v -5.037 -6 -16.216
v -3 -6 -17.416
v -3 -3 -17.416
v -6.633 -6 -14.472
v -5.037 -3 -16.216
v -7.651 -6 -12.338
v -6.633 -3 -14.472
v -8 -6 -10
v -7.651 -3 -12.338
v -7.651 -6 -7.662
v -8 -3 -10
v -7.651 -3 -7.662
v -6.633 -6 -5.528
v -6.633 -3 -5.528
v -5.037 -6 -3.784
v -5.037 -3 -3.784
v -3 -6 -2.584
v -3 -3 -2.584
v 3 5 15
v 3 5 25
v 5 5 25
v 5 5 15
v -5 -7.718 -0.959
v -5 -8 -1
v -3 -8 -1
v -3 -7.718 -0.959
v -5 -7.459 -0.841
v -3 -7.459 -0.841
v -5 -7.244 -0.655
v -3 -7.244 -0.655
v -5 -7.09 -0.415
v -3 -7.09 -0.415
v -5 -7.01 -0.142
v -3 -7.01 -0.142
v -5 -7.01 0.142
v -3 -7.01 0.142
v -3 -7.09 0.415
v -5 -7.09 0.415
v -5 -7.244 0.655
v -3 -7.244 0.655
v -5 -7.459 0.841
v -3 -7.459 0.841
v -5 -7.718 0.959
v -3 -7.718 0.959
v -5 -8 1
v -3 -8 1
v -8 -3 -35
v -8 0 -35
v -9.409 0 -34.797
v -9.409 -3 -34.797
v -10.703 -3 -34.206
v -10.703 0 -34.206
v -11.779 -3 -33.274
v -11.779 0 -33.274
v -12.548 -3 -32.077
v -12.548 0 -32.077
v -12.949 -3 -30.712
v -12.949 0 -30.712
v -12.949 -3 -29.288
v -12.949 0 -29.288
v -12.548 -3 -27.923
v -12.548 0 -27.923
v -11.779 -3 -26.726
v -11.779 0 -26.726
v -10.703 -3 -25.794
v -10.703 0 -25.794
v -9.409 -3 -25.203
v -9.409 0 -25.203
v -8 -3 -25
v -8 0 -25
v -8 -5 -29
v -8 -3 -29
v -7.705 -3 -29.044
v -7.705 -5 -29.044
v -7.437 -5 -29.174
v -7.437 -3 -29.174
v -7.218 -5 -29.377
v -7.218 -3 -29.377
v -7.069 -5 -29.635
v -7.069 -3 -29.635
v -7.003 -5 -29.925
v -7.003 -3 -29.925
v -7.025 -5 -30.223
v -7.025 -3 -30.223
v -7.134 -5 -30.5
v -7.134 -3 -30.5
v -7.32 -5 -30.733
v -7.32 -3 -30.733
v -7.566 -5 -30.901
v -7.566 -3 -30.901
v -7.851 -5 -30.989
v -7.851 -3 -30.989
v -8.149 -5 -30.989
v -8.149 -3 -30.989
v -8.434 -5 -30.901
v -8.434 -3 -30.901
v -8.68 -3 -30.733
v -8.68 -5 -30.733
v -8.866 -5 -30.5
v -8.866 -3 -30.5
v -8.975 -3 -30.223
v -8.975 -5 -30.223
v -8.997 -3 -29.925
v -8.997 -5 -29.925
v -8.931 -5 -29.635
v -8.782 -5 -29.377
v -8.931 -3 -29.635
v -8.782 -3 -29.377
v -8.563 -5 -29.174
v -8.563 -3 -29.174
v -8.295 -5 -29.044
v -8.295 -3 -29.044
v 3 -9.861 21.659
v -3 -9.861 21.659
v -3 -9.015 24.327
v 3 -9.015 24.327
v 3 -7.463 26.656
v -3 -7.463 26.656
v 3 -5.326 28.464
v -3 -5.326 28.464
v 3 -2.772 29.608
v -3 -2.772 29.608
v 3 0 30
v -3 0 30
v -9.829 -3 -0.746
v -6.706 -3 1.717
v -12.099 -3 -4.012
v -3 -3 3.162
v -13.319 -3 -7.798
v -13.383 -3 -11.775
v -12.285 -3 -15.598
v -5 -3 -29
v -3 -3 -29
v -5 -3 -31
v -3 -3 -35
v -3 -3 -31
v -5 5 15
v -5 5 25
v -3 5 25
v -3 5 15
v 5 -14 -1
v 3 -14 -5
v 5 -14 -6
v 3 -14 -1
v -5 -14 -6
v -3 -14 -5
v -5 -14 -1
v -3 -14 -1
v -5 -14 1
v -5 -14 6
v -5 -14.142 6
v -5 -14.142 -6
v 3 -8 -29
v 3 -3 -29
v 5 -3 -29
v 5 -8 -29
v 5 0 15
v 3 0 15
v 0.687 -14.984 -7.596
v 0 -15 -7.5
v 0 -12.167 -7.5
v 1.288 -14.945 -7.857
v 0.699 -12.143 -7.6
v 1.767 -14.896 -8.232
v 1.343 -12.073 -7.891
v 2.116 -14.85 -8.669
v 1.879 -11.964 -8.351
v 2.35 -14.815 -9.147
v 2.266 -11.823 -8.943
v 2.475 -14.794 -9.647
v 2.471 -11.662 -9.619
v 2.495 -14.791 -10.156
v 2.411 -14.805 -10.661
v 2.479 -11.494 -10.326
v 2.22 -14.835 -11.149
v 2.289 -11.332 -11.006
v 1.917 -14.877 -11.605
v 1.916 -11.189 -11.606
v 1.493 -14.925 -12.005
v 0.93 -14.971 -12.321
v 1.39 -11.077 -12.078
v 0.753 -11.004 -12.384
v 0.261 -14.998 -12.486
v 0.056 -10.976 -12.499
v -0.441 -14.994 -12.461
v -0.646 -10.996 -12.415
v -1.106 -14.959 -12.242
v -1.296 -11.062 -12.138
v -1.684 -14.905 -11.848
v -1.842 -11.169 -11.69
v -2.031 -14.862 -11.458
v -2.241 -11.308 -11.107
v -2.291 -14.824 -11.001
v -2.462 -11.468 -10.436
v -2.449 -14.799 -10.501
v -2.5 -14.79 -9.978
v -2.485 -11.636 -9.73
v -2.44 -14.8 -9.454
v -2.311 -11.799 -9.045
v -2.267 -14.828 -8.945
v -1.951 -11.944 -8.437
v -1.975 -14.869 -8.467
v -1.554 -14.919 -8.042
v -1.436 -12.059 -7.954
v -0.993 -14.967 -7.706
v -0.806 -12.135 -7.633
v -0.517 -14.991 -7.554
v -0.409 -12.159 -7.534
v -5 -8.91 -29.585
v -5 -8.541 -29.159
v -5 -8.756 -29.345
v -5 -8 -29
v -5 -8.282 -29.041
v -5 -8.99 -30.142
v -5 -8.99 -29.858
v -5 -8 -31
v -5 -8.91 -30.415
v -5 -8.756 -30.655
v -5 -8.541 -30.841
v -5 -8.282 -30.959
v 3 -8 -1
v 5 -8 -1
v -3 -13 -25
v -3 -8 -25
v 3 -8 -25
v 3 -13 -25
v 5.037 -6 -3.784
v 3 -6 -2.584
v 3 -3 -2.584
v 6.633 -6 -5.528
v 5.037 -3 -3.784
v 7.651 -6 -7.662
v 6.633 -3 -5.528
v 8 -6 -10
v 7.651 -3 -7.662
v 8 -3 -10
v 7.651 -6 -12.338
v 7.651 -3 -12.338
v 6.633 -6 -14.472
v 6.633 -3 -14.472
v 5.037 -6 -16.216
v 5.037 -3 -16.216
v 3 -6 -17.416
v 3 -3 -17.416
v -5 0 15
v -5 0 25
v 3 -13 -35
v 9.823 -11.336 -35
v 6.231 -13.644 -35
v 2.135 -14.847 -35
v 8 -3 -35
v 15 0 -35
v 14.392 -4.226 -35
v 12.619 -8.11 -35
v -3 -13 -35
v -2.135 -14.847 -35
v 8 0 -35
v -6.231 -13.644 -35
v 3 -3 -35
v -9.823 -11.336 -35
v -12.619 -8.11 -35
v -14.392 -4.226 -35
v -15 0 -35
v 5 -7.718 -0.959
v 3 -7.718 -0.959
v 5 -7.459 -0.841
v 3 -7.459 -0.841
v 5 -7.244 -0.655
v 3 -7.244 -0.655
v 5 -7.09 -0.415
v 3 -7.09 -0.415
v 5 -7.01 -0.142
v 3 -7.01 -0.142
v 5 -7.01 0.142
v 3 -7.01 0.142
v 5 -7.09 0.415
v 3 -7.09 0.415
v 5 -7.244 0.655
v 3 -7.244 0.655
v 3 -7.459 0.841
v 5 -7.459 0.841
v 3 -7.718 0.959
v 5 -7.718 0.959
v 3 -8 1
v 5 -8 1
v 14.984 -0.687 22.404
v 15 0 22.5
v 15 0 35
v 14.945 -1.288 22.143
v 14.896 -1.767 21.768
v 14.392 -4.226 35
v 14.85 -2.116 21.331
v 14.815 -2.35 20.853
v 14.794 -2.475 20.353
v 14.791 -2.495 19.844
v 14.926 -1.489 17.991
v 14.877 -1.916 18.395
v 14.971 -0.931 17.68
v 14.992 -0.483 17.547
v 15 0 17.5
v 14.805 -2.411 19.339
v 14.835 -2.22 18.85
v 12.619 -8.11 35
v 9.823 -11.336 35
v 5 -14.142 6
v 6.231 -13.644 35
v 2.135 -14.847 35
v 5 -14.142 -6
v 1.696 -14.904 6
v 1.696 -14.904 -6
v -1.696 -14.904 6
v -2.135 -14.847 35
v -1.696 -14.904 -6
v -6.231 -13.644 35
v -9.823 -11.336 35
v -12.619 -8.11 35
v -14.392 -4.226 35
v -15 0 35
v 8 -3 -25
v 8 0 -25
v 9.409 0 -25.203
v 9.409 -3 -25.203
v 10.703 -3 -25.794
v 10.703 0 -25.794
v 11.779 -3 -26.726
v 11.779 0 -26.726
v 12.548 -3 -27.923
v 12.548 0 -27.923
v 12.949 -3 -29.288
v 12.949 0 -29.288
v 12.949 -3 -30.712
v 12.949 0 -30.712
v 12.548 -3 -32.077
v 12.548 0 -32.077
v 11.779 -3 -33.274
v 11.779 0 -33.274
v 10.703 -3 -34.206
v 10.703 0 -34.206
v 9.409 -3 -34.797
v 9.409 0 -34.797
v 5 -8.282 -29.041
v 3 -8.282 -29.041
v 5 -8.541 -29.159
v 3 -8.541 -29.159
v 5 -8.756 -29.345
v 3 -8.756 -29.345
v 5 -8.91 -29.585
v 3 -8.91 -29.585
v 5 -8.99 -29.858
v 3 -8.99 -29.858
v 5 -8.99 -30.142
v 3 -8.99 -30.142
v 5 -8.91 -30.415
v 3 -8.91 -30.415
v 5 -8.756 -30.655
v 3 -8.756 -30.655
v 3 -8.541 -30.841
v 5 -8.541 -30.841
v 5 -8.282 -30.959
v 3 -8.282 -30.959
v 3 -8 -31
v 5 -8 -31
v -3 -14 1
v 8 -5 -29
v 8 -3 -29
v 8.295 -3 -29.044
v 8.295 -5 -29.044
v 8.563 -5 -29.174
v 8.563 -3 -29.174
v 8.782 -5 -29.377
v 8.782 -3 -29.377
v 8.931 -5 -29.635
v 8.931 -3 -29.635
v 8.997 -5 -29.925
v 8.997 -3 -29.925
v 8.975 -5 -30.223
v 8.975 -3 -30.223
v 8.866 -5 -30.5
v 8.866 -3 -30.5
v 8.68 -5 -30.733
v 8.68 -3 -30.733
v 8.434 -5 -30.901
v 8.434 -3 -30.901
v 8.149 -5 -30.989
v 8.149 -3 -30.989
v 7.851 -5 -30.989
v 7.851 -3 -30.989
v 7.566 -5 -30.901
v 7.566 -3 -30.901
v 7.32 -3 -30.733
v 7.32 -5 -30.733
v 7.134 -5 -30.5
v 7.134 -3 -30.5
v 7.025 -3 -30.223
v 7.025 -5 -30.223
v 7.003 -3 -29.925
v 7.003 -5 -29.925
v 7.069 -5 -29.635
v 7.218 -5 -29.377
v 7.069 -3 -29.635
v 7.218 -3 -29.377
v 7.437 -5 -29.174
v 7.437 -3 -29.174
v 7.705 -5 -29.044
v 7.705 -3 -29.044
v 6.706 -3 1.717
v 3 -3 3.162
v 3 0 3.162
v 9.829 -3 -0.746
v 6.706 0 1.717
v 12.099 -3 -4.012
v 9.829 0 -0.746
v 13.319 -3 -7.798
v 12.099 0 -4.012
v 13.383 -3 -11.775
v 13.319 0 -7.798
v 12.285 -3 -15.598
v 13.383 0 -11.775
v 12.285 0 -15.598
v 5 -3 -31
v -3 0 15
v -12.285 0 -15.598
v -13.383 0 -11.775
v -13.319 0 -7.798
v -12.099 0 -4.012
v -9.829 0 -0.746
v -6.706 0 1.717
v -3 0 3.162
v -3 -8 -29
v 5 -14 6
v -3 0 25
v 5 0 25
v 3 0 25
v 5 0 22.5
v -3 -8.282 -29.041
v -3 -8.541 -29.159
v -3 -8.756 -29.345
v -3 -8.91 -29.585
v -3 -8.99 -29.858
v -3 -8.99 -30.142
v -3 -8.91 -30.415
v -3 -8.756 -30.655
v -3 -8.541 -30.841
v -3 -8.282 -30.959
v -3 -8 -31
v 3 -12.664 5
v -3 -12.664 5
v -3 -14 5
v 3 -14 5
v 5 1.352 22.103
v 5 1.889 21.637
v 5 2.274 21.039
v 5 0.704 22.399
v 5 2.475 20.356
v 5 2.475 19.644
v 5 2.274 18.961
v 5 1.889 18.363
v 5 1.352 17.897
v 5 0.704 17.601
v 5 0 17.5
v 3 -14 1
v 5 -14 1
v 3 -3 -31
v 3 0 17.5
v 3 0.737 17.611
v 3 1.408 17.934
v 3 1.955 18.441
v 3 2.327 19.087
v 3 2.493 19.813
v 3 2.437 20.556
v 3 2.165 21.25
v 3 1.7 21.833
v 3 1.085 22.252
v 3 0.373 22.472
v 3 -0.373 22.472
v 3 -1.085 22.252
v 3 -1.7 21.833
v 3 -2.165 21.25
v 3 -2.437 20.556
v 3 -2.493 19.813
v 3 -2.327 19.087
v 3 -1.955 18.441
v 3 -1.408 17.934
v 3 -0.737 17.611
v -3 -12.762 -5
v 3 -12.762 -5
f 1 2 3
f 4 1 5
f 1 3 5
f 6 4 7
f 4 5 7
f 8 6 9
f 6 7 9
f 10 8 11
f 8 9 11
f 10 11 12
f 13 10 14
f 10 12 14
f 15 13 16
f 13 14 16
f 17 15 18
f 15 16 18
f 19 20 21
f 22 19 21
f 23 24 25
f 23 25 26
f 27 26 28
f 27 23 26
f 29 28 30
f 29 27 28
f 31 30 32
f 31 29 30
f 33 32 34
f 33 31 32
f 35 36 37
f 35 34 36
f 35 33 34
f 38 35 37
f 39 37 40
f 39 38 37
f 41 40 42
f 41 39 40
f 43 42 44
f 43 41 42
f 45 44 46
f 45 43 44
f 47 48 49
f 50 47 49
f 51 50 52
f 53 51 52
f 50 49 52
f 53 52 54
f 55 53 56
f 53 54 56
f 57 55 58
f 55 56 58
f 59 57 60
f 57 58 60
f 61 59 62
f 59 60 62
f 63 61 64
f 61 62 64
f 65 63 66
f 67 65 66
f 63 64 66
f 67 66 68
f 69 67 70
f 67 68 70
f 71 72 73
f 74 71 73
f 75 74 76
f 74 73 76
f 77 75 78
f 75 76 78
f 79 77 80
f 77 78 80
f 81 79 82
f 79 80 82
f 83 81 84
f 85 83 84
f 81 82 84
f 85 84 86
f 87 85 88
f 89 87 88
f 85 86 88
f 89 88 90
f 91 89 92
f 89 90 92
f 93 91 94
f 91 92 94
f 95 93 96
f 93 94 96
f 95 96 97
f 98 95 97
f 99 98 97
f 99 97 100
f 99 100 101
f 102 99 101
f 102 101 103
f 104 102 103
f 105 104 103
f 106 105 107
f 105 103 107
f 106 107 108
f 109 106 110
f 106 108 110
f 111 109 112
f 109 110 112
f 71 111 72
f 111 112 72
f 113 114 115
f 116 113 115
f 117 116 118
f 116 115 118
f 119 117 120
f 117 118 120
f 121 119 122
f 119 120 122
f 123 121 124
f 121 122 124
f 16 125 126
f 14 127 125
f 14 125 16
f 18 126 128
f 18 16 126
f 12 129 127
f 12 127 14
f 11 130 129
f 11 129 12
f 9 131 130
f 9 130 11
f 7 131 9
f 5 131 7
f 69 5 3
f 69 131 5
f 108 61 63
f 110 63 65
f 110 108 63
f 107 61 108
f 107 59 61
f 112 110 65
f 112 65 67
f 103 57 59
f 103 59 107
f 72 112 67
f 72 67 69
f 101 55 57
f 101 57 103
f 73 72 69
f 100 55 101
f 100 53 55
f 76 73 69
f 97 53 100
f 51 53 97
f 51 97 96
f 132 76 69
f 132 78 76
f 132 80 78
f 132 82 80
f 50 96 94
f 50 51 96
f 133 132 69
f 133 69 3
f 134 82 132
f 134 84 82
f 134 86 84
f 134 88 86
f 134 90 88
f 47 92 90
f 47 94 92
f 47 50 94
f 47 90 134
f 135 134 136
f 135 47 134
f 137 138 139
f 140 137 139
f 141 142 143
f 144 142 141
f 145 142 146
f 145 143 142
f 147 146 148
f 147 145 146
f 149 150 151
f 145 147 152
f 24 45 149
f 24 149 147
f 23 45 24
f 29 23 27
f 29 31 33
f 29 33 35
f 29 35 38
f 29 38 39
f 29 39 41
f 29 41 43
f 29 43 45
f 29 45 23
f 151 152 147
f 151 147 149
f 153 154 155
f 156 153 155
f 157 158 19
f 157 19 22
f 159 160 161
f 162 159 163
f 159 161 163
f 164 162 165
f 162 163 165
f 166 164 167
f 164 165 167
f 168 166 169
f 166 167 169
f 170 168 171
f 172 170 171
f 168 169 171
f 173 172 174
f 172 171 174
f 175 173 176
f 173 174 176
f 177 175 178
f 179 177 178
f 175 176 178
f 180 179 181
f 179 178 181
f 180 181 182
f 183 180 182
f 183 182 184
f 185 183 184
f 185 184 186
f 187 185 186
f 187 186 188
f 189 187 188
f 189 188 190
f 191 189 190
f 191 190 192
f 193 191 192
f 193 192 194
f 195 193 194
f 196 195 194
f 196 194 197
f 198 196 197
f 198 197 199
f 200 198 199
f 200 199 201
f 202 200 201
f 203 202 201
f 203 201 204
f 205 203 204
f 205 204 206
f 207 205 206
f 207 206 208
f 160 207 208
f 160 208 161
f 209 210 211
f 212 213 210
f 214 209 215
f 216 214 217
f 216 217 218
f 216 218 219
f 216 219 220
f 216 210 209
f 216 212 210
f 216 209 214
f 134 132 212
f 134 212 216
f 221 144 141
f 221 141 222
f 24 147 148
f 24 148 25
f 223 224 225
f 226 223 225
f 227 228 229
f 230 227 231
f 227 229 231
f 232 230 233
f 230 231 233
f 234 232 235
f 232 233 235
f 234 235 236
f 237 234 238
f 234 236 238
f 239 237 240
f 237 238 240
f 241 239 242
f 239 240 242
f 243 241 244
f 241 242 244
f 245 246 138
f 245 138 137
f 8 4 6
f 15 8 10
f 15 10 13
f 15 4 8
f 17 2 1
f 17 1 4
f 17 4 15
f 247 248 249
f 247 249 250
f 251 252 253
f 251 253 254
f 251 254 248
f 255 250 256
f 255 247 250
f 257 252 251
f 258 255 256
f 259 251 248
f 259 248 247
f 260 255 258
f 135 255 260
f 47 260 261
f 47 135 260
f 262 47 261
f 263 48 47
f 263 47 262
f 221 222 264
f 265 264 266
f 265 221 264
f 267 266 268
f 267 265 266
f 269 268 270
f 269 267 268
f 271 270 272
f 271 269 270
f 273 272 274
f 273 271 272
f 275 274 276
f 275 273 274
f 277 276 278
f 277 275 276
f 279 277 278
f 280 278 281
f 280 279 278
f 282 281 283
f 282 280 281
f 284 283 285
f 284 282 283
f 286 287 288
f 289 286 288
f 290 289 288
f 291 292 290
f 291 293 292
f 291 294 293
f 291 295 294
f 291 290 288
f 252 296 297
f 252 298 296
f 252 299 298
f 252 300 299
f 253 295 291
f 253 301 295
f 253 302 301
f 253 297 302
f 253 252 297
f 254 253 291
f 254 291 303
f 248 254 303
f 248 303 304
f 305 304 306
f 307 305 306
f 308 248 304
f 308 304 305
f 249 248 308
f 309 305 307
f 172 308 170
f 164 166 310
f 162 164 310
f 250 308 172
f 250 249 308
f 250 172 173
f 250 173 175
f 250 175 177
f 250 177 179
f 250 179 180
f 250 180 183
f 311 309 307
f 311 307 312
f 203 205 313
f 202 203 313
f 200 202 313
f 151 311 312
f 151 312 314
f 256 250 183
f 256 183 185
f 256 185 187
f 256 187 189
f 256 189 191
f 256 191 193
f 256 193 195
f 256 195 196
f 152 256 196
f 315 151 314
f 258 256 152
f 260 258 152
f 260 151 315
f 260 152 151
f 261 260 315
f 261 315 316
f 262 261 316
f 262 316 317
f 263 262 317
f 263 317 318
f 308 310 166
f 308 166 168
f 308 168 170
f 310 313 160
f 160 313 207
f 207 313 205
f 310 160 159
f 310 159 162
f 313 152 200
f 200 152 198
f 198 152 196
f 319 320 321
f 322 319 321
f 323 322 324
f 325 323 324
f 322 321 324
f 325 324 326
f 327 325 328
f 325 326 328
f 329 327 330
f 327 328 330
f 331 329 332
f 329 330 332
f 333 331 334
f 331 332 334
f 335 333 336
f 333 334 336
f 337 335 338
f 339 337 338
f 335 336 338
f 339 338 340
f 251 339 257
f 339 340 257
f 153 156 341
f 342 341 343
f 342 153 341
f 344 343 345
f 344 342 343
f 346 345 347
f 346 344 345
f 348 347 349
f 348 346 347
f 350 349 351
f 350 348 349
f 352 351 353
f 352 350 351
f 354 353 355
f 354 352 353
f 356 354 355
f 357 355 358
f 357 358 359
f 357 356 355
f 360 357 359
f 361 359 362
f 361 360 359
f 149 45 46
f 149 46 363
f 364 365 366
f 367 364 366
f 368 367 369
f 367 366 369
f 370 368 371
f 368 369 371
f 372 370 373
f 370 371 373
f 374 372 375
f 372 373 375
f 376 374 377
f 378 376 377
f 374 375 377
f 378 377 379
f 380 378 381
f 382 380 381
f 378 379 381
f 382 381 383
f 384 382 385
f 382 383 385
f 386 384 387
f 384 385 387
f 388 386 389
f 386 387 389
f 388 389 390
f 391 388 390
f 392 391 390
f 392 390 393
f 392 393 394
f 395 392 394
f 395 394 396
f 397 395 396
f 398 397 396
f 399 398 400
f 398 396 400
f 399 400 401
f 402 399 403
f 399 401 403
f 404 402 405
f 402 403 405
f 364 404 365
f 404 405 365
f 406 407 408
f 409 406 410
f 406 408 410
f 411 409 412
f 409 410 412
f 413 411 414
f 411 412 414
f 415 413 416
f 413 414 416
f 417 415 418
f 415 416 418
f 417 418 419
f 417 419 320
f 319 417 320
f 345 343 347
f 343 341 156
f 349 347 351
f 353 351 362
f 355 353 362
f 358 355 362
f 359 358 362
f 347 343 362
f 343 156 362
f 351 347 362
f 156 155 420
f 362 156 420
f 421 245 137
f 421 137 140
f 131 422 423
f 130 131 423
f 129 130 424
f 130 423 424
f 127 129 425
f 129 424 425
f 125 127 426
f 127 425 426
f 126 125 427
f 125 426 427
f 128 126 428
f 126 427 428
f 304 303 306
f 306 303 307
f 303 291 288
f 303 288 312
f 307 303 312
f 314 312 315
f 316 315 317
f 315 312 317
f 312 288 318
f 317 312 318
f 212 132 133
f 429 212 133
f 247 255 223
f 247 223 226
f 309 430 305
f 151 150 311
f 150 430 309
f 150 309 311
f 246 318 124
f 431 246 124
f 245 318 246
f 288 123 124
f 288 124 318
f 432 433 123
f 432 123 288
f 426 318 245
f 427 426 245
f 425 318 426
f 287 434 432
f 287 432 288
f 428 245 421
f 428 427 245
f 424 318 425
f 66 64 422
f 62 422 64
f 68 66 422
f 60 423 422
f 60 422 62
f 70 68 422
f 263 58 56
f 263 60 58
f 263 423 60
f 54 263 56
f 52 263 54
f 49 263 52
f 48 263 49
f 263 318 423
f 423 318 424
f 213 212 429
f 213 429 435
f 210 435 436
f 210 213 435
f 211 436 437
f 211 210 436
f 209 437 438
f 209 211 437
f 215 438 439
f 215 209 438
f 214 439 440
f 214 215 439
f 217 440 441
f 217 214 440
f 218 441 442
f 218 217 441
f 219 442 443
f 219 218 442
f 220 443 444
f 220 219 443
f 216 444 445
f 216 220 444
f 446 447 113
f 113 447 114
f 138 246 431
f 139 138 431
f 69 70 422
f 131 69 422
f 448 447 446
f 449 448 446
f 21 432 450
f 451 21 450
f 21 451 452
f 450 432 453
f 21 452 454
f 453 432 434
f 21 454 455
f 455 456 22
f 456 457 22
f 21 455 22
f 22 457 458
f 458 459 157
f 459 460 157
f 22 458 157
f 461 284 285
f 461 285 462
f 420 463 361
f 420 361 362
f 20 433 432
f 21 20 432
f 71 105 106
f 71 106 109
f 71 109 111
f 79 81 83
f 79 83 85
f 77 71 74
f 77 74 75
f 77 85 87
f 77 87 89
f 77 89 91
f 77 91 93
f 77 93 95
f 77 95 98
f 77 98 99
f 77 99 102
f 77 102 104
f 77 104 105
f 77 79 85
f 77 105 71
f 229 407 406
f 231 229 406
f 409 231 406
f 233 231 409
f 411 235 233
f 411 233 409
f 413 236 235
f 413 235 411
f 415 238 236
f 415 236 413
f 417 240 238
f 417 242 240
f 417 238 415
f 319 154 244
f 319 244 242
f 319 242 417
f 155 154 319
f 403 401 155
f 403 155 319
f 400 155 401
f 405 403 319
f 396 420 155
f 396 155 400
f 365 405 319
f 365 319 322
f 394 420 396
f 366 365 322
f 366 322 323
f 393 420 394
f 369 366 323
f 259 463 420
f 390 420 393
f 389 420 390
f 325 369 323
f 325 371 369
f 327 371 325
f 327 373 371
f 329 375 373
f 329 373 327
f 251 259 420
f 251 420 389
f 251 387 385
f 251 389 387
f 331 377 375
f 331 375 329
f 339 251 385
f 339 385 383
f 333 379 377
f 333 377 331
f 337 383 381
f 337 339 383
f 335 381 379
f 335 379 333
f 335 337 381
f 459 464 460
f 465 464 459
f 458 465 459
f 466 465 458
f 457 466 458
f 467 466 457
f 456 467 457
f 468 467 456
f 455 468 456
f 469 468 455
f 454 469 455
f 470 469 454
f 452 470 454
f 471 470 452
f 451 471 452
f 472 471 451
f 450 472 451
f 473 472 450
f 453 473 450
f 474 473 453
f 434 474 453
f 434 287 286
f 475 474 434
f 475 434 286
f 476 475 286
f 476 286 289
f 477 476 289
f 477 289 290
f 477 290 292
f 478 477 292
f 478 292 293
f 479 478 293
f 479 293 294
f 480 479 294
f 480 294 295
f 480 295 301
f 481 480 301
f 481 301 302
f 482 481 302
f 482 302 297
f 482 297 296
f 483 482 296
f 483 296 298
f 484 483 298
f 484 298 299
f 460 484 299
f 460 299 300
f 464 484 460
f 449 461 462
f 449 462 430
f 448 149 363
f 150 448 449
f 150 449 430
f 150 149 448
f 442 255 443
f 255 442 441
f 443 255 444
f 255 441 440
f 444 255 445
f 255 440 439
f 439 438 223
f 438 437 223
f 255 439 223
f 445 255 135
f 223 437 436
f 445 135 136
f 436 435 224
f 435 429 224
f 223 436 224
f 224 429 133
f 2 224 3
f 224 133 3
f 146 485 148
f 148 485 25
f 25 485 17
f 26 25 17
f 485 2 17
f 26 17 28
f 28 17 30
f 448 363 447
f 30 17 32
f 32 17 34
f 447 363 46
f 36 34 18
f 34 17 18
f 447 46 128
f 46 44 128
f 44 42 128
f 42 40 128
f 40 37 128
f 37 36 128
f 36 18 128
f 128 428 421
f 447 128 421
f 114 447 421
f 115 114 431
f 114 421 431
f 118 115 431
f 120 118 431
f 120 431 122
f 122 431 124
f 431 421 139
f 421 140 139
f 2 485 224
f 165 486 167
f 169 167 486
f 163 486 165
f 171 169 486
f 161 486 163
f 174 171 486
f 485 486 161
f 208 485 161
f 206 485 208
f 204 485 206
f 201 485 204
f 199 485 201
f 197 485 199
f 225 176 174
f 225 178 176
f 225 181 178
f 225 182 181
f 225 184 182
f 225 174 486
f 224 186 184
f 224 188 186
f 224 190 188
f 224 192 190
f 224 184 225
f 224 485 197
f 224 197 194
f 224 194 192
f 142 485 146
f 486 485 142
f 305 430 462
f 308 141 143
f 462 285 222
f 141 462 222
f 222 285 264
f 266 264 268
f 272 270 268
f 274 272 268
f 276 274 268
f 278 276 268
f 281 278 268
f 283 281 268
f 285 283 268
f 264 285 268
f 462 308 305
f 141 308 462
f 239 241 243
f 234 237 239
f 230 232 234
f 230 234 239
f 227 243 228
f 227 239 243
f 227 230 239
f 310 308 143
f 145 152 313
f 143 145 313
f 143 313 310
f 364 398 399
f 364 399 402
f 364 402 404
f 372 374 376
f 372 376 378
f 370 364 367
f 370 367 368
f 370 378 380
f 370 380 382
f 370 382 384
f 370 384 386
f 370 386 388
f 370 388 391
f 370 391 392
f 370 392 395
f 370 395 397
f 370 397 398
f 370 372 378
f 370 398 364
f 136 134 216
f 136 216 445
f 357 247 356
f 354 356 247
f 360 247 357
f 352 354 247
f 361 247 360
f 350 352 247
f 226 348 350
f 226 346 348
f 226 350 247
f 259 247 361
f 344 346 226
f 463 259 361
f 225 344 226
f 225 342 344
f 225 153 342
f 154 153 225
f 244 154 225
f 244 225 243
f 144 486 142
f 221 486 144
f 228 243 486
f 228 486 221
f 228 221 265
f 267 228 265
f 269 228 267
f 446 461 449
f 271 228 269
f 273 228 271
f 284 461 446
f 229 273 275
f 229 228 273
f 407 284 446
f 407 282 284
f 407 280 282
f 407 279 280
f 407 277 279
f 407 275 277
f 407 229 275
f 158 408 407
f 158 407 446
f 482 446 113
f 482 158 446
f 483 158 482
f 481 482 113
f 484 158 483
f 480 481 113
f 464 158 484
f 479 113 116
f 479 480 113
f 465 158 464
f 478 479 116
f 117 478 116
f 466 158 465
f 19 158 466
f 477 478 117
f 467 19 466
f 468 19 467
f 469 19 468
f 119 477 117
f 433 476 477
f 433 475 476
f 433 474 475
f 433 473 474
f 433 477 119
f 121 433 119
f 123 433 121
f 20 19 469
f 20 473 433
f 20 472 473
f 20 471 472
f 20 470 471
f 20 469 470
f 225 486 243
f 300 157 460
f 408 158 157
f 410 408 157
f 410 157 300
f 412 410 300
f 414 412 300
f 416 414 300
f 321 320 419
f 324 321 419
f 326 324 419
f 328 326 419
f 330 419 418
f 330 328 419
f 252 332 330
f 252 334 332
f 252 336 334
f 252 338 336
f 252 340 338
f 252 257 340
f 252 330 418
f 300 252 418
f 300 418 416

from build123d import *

# Parameters (mm, degrees)
SALIENTE_EXTRUIR1_DEPTH      = 35
SALIENTE_EXTRUIR1_DEPTH_BACK = 35
CORTAR_EXTRUIR1_DEPTH        = 3
CROQUIS4_R                   = 8
CORTAR_EXTRUIR2_DEPTH        = 3
CROQUIS5_R                   = 2.5
CORTAR_EXTRUIR3_DEPTH        = 10
CROQUIS6_W                   = 6
CROQUIS6_H                   = 10
CORTAR_EXTRUIR5_DEPTH        = 10
CROQUIS7_W                   = 2
CROQUIS7_H                   = 2
CORTAR_EXTRUIR6_DEPTH        = 5
CROQUIS8_R                   = 1
CORTAR_EXTRUIR7_DEPTH        = 2
CROQUIS9_W                   = 6
CROQUIS9_H                   = 10
CORTAR_EXTRUIR8_DEPTH        = 12
CORTAR_EXTRUIR9_DEPTH        = 5
CORTAR_EXTRUIR9_DEPTH_BACK   = 5
CROQUIS10_R                  = 1
CORTAR_EXTRUIR10_DEPTH       = 5
CORTAR_EXTRUIR10_DEPTH_BACK  = 5
CORTAR_EXTRUIR11_DEPTH       = 3
CORTAR_EXTRUIR11_DEPTH_BACK  = 3
CROQUIS14_W                  = 2
CROQUIS14_H                  = 10
SALIENTE_EXTRUIR2_DEPTH      = 5
CROQUIS15_R                  = 2.5
CORTAR_EXTRUIR12_DEPTH       = 15


with BuildPart() as part:
    # Croquis1 → Saliente-Extruir1 (new, two sides: drawn at the far end of the back side and taken through both)
    with BuildSketch(Plane.XY.offset(-SALIENTE_EXTRUIR1_DEPTH_BACK)):
        with BuildLine():
            Line((-15, 0), (15, 0))
            ThreePointArc((15, 0), (0, -15), (-15, 0))
        make_face()
    extrude(amount=SALIENTE_EXTRUIR1_DEPTH + SALIENTE_EXTRUIR1_DEPTH_BACK)

    # Croquis3 → Cortar-Extruir1 (cut)
    with BuildSketch(Plane(origin=(0, 0, 0), x_dir=(1, 0, 0), z_dir=(0, 1, 0))):
        with BuildLine():
            Line((-8, 25), (-12.284525276, 15.598253186))
            ThreePointArc((-12.284525276, 15.598253186), (0, -3.5), (12.284525276, 15.598253186))
            Line((12.284525276, 15.598253186), (8, 25))
            ThreePointArc((8, 25), (13, 30), (8, 35))
            Line((8, 35), (-8, 35))
            ThreePointArc((-8, 35), (-13, 30), (-8, 25))
        make_face()
    extrude(amount=-CORTAR_EXTRUIR1_DEPTH, mode=Mode.SUBTRACT)

    # Croquis4 → Cortar-Extruir2 (cut)
    with BuildSketch(Plane(origin=(0, -3, 0), x_dir=(1, 0, 0), z_dir=(0, 1, 0))):
        with Locations((0, 10)):
            Circle(CROQUIS4_R)
    extrude(amount=-CORTAR_EXTRUIR2_DEPTH, mode=Mode.SUBTRACT)

    # Croquis5 → Cortar-Extruir3 (cut)
    with BuildSketch(Plane(origin=(0, -6, 0), x_dir=(1, 0, 0), z_dir=(0, 1, 0))):
        with Locations((0, 10)):
            Circle(CROQUIS5_R)
    extrude(amount=-CORTAR_EXTRUIR3_DEPTH, mode=Mode.SUBTRACT)

    # Croquis6 → Cortar-Extruir5 (cut)
    with BuildSketch(Plane(origin=(0, -3, 0), x_dir=(1, 0, 0), z_dir=(0, 1, 0))):
        with Locations((0, 30)):
            Rectangle(CROQUIS6_W, CROQUIS6_H)
    extrude(amount=-CORTAR_EXTRUIR5_DEPTH, mode=Mode.SUBTRACT)

    # Croquis7 → Cortar-Extruir6 (cut)
    with BuildSketch(Plane(origin=(0, -3, 0), x_dir=(1, 0, 0), z_dir=(0, 1, 0))):
        with Locations((-4, 30)):
            Rectangle(CROQUIS7_W, CROQUIS7_H)
        with Locations((4, 30)):
            Rectangle(CROQUIS7_W, CROQUIS7_H)
    extrude(amount=-CORTAR_EXTRUIR6_DEPTH, mode=Mode.SUBTRACT)

    # Croquis8 → Cortar-Extruir7 (cut)
    with BuildSketch(Plane(origin=(0, -3, 0), x_dir=(1, 0, 0), z_dir=(0, 1, 0))):
        with Locations((-8, 30)):
            Circle(CROQUIS8_R)
        with Locations((8, 30)):
            Circle(CROQUIS8_R)
    extrude(amount=-CORTAR_EXTRUIR7_DEPTH, mode=Mode.SUBTRACT)

    # Croquis9 → Cortar-Extruir8 (cut)
    with BuildSketch(Plane(origin=(0, -3, 0), x_dir=(1, 0, 0), z_dir=(0, 1, 0))):
        Rectangle(CROQUIS9_W, CROQUIS9_H)
    extrude(amount=-CORTAR_EXTRUIR8_DEPTH, mode=Mode.SUBTRACT)

    # Croquis10 → Cortar-Extruir9 (cut, two sides: drawn at the far end of the back side and taken through both)
    with BuildSketch(Plane(origin=(0, 0, 0), x_dir=(0, 0, -1), z_dir=(1, 0, 0)).offset(-CORTAR_EXTRUIR9_DEPTH_BACK)):
        with Locations((30, -8)):
            Circle(CROQUIS10_R)
    extrude(amount=CORTAR_EXTRUIR9_DEPTH + CORTAR_EXTRUIR9_DEPTH_BACK, mode=Mode.SUBTRACT)

    # Croquis11 → Cortar-Extruir10 (cut, two sides: drawn at the far end of the back side and taken through both)
    with BuildSketch(Plane(origin=(0, 0, 0), x_dir=(0, 0, -1), z_dir=(1, 0, 0)).offset(-CORTAR_EXTRUIR10_DEPTH_BACK)):
        with BuildLine():
            Line((-6, -15), (6, -15))
            Line((6, -15), (6, -14))
            Line((6, -14), (1, -14))
            Line((1, -14), (1, -8))
            ThreePointArc((1, -8), (0, -7), (-1, -8))
            Line((-1, -8), (-1, -14))
            Line((-1, -14), (-6, -14))
            Line((-6, -14), (-6, -15))
        make_face()
    extrude(amount=CORTAR_EXTRUIR10_DEPTH + CORTAR_EXTRUIR10_DEPTH_BACK, mode=Mode.SUBTRACT)

    # Croquis12 → Cortar-Extruir11 (cut, two sides: drawn at the far end of the back side and taken through both)
    with BuildSketch(Plane(origin=(0, 0, 0), x_dir=(0, 0, -1), z_dir=(1, 0, 0)).offset(-CORTAR_EXTRUIR11_DEPTH_BACK)):
        with BuildLine():
            Line((-3, -13), (-21.658767316, -9.861464952))
            ThreePointArc((-21.658767316, -9.861464952), (-27.635040051, -6.458030924), (-30, 0))
            Line((-30, 0), (-3, 0))
            Line((-3, 0), (-3, -13))
        make_face()
        Polygon((25, -8), (25, -3), (4, -3), (4, -13), align=None)
    extrude(amount=CORTAR_EXTRUIR11_DEPTH + CORTAR_EXTRUIR11_DEPTH_BACK, mode=Mode.SUBTRACT)

    # Croquis14 → Saliente-Extruir2 (add)
    with BuildSketch(Plane(origin=(0, 0, 0), x_dir=(1, 0, 0), z_dir=(0, 1, 0))):
        with Locations((4, -20)):
            Rectangle(CROQUIS14_W, CROQUIS14_H)
        with Locations((-4, -20)):
            Rectangle(CROQUIS14_W, CROQUIS14_H)
    extrude(amount=SALIENTE_EXTRUIR2_DEPTH)

    # Croquis15 → Cortar-Extruir12 (cut)
    with BuildSketch(Plane(origin=(0, 0, 0), x_dir=(0, 0, -1), z_dir=(1, 0, 0))):
        with Locations((-20, 0)):
            Circle(CROQUIS15_R)
    extrude(amount=CORTAR_EXTRUIR12_DEPTH, mode=Mode.SUBTRACT)


solid = part.part
